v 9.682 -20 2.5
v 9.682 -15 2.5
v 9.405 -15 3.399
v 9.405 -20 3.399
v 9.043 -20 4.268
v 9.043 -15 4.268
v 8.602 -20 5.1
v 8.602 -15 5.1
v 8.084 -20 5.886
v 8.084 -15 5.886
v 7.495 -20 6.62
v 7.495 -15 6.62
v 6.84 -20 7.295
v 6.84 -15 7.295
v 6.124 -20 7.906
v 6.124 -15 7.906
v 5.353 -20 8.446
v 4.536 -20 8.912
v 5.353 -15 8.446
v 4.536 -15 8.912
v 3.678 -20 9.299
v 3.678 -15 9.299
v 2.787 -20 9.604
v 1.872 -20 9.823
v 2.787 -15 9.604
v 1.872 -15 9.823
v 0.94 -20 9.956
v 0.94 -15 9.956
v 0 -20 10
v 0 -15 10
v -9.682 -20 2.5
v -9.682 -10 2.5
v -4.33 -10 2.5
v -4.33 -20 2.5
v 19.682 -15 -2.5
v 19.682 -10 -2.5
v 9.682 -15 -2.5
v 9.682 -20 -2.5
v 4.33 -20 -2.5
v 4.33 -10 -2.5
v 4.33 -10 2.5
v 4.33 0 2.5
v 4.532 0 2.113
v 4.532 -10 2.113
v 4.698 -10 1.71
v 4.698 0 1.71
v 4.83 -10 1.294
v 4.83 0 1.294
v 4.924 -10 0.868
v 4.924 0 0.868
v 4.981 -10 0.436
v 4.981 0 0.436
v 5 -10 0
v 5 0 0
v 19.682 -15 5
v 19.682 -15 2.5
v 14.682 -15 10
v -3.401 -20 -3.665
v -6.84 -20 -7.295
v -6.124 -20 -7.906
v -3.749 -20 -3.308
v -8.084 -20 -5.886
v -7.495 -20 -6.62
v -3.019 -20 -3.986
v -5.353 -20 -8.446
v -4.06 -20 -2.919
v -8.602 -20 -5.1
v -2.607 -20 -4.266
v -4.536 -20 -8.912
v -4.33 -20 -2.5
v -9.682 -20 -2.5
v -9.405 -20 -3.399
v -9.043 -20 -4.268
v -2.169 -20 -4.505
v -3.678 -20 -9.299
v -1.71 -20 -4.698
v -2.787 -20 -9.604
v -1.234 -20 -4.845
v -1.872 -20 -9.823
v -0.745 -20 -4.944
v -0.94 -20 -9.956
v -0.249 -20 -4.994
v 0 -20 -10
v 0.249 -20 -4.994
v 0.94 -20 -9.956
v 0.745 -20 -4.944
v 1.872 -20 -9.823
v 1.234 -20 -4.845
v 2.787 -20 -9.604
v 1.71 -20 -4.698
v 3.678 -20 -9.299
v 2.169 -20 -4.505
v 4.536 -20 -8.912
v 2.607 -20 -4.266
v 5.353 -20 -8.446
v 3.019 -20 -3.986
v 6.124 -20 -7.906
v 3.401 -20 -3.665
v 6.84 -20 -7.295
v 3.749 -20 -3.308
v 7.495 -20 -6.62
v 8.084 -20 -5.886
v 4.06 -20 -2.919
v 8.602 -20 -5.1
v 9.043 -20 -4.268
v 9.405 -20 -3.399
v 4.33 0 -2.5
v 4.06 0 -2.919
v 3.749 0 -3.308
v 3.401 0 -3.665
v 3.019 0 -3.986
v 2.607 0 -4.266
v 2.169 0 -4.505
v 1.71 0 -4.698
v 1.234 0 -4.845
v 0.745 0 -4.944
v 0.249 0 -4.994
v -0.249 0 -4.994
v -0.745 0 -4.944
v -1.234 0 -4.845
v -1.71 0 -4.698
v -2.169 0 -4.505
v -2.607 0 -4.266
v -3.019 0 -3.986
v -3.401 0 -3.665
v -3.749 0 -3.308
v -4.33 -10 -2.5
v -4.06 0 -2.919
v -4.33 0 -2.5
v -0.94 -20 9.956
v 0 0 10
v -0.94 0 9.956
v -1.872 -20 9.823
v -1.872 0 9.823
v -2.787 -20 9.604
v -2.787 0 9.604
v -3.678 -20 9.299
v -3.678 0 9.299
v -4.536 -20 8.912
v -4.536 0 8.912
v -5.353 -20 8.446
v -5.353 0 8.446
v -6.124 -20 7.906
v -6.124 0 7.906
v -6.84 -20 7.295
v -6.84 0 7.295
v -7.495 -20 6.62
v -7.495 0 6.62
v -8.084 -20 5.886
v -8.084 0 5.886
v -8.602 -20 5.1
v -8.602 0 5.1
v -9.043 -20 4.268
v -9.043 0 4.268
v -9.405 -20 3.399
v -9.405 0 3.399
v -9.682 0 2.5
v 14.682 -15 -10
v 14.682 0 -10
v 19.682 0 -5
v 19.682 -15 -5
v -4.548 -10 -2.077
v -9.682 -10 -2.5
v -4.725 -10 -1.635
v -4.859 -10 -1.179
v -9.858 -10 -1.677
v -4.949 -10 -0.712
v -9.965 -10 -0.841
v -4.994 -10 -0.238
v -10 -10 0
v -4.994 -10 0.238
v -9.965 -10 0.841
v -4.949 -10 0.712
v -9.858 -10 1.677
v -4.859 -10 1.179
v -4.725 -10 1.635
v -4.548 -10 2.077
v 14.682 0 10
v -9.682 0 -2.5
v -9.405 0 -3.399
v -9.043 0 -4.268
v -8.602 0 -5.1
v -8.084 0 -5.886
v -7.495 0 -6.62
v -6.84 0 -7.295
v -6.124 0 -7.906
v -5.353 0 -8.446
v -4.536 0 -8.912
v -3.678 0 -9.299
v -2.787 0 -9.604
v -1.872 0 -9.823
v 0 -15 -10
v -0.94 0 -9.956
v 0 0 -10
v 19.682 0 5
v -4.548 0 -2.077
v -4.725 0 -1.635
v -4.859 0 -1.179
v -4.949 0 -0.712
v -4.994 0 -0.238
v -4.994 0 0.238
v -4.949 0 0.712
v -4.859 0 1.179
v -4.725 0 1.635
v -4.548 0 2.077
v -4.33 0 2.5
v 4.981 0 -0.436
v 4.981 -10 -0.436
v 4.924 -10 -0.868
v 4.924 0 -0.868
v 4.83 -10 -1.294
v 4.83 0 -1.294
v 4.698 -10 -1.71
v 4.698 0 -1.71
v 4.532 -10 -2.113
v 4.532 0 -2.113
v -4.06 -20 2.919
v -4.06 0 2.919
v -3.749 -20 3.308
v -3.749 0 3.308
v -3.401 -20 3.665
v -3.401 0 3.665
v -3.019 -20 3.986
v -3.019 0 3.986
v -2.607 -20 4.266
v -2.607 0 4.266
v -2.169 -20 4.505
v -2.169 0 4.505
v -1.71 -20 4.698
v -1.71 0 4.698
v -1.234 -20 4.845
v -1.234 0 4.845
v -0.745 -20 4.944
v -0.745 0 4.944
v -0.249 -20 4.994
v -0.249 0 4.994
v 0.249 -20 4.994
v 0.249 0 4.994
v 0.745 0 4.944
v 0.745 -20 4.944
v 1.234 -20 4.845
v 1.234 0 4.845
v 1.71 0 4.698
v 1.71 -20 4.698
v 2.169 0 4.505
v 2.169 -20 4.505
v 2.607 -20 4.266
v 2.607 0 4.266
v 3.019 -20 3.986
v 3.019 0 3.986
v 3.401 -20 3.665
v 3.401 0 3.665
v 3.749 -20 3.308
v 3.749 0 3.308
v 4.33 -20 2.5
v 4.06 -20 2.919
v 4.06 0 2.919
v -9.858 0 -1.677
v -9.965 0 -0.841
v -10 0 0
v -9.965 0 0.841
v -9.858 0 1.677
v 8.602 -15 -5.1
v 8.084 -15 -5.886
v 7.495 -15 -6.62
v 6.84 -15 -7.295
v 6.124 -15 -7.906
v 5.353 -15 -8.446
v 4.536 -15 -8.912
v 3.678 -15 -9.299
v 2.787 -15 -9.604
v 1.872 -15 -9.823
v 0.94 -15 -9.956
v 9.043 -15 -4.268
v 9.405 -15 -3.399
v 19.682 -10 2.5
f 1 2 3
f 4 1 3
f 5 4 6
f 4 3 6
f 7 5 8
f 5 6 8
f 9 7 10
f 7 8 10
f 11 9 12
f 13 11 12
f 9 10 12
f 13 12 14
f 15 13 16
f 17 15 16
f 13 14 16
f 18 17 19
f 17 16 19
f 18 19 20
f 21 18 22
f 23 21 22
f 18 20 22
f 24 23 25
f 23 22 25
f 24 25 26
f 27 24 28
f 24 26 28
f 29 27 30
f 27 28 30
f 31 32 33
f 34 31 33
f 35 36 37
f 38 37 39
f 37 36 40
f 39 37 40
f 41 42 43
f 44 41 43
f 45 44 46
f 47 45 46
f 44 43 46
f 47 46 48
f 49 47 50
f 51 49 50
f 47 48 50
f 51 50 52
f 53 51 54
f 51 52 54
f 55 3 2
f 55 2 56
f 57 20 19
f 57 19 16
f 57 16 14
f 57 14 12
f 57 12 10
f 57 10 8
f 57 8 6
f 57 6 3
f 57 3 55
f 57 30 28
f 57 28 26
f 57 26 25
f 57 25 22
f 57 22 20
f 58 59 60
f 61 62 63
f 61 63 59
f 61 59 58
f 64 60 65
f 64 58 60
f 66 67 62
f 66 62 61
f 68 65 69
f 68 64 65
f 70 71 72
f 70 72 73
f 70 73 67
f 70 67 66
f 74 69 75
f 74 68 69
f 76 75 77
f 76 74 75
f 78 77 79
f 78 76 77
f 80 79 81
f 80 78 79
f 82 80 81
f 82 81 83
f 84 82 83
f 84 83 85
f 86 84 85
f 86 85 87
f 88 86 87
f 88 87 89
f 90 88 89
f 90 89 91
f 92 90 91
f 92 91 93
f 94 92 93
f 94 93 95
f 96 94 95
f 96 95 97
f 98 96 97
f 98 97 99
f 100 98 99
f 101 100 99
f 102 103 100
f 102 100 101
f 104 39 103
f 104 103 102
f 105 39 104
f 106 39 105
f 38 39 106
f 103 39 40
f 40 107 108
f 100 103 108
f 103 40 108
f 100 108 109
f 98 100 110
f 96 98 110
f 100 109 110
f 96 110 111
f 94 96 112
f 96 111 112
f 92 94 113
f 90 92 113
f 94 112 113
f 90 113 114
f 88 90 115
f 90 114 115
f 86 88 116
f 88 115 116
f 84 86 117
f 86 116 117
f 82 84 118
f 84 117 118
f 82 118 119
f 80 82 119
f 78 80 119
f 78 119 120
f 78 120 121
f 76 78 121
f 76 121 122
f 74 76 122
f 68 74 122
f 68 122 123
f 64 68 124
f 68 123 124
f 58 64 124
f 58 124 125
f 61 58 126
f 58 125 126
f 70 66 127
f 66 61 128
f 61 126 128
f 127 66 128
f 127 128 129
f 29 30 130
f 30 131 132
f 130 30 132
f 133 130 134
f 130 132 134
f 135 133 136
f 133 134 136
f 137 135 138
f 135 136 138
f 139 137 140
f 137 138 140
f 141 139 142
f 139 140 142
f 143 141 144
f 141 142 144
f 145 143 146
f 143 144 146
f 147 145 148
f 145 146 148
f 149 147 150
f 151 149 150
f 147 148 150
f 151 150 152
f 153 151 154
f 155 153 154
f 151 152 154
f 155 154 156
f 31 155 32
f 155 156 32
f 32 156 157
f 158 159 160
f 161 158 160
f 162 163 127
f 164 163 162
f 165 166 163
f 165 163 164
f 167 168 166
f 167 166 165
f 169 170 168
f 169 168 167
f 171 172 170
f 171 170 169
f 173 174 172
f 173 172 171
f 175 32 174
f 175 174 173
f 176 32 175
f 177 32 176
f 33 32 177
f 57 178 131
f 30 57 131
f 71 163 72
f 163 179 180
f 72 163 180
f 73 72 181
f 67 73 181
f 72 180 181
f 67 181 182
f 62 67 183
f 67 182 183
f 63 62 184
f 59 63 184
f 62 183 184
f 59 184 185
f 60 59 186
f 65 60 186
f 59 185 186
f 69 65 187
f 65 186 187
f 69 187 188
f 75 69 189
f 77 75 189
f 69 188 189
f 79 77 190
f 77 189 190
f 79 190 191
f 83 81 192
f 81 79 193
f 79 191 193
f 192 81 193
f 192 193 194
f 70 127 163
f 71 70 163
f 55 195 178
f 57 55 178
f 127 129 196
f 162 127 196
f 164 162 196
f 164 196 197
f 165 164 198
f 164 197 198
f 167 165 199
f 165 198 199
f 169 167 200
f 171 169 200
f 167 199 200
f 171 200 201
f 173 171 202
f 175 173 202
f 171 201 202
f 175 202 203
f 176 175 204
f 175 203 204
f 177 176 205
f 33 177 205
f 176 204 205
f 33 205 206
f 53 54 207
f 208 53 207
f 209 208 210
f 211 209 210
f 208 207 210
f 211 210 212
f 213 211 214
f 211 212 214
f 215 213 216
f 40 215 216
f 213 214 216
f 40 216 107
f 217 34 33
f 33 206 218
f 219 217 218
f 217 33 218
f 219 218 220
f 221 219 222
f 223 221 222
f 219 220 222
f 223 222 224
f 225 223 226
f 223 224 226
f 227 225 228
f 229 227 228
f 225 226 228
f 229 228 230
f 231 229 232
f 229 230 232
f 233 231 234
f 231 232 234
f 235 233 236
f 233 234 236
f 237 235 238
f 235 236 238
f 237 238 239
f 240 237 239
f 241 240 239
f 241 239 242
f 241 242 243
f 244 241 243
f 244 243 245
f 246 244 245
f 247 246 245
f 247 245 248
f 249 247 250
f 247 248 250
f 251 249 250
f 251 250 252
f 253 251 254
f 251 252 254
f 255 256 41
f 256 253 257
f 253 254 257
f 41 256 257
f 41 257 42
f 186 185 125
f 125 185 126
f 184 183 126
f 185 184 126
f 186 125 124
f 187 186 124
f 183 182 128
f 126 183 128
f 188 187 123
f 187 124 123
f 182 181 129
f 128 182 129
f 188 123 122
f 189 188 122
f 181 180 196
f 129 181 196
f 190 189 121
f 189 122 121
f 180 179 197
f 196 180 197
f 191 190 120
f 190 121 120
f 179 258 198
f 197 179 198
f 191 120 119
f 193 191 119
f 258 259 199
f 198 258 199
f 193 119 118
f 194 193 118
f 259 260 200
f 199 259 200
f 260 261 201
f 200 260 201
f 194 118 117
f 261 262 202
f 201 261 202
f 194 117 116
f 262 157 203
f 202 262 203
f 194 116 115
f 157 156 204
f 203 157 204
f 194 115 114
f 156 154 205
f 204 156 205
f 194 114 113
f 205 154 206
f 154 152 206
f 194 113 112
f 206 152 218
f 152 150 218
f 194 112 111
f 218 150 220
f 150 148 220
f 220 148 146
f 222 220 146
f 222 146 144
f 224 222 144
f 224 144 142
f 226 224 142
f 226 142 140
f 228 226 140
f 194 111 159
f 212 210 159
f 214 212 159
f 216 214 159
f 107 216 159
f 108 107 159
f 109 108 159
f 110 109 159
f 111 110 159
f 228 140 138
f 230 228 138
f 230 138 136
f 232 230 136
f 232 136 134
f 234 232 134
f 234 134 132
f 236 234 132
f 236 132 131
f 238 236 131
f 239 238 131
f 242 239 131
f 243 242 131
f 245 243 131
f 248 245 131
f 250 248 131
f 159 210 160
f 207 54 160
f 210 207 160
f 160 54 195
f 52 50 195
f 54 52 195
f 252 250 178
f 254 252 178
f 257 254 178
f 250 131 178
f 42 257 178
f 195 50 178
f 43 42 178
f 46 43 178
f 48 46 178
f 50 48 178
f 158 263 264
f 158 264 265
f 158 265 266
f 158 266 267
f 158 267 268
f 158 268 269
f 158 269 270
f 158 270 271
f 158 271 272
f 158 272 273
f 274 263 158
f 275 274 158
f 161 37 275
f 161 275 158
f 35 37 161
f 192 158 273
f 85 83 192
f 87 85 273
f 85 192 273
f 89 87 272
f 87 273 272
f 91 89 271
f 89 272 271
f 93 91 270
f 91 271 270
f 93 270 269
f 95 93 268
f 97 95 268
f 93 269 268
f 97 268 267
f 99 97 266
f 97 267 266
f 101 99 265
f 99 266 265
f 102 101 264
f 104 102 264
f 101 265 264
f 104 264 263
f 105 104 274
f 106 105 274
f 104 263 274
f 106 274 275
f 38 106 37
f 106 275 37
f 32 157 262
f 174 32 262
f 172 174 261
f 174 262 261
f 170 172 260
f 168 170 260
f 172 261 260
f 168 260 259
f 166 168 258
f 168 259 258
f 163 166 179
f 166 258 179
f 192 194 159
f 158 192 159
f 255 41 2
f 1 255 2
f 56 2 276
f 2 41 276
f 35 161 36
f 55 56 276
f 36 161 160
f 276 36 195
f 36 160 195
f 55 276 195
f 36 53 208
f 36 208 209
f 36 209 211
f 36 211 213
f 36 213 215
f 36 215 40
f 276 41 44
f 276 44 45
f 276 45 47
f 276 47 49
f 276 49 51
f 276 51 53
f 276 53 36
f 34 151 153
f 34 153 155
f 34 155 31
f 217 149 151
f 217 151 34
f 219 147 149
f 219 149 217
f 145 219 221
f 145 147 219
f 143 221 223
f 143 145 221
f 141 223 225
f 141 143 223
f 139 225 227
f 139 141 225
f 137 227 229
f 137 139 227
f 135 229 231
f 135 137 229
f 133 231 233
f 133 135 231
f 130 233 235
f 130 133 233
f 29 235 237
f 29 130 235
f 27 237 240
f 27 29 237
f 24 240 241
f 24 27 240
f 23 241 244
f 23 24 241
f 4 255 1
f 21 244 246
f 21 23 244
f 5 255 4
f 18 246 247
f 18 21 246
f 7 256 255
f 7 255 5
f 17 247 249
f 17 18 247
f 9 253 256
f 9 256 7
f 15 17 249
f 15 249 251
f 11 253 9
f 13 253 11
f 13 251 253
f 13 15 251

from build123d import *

# Parameters (mm, degrees)
F1_DEPTH = 20
F2_DEPTH = 15
F3_DEPTH = 10


with BuildPart() as f1:
    # F0 (on Front) → F1 (new body)
    with BuildSketch(Plane.XZ):
        with BuildLine():
            ThreePointArc((-4.3301270189, 2.5), (0, 5), (4.3301270189, 2.5))
            Line((4.3301270189, 2.5), (9.6824583655, 2.5))
            ThreePointArc((9.6824583655, 2.5), (6.123724357, 7.9056941504), (0, 10))
            ThreePointArc((0, 10), (-6.123724357, 7.9056941504), (-9.6824583655, 2.5))
            Line((-9.6824583655, 2.5), (-4.3301270189, 2.5))
        make_face()
    extrude(amount=F1_DEPTH)

    # F0 (on Front) → F2 (join)
    with BuildSketch(Plane.XZ):
        with BuildLine():
            ThreePointArc((0, 10), (6.123724357, 7.9056941504), (9.6824583655, 2.5))
            Line((9.6824583655, 2.5), (19.6824583655, 2.5))
            Line((19.6824583655, 2.5), (19.6824583655, 5))
            Line((19.6824583655, 5), (14.6824583655, 10))
            Line((14.6824583655, 10), (0, 10))
        make_face()
    extrude(amount=F2_DEPTH)



with BuildPart() as f1b:
    # F0 (on Front) → F1, piece 2 (new body)
    with BuildSketch(Plane.XZ):
        with BuildLine():
            Line((9.6824583655, -2.5), (4.3301270189, -2.5))
            ThreePointArc((4.3301270189, -2.5), (0, -5), (-4.3301270189, -2.5))
            Line((-4.3301270189, -2.5), (-9.6824583655, -2.5))
            ThreePointArc((-9.6824583655, -2.5), (-6.123724357, -7.9056941504), (0, -10))
            ThreePointArc((0, -10), (6.123724357, -7.9056941504), (9.6824583655, -2.5))
        make_face()
    extrude(amount=F1_DEPTH)

    # F0 (on Front) → F2, piece 2 (join)
    with BuildSketch(Plane.XZ):
        with BuildLine():
            Line((19.6824583655, -2.5), (9.6824583655, -2.5))
            ThreePointArc((9.6824583655, -2.5), (6.123724357, -7.9056941504), (0, -10))
            Line((0, -10), (14.6824583655, -10))
            Line((14.6824583655, -10), (19.6824583655, -5))
            Line((19.6824583655, -5), (19.6824583655, -2.5))
        make_face()
    extrude(amount=F2_DEPTH)


with BuildPart() as f1_1:
    add(f1.part)

    add(f1b.part)  # F3 merges F1b
    # F0 (on Front) → F3 (join)
    with BuildSketch(Plane.XZ):
        with BuildLine():
            ThreePointArc((4.3301270189, 2.5), (4.8296291314, 1.2940952255), (5, 0))
            ThreePointArc((5, 0), (4.8296291314, -1.2940952255), (4.3301270189, -2.5))
            Line((4.3301270189, -2.5), (9.6824583655, -2.5))
            Line((9.6824583655, -2.5), (19.6824583655, -2.5))
            Line((19.6824583655, -2.5), (19.6824583655, 2.5))
            Line((19.6824583655, 2.5), (9.6824583655, 2.5))
            Line((9.6824583655, 2.5), (4.3301270189, 2.5))
        make_face()
        with BuildLine():
            ThreePointArc((-4.3301270189, -2.5), (-5, 0), (-4.3301270189, 2.5))
            Line((-4.3301270189, 2.5), (-9.6824583655, 2.5))
            ThreePointArc((-9.6824583655, 2.5), (-10, 0), (-9.6824583655, -2.5))
            Line((-9.6824583655, -2.5), (-4.3301270189, -2.5))
        make_face()
    extrude(amount=F3_DEPTH)


solid = f1_1.part
